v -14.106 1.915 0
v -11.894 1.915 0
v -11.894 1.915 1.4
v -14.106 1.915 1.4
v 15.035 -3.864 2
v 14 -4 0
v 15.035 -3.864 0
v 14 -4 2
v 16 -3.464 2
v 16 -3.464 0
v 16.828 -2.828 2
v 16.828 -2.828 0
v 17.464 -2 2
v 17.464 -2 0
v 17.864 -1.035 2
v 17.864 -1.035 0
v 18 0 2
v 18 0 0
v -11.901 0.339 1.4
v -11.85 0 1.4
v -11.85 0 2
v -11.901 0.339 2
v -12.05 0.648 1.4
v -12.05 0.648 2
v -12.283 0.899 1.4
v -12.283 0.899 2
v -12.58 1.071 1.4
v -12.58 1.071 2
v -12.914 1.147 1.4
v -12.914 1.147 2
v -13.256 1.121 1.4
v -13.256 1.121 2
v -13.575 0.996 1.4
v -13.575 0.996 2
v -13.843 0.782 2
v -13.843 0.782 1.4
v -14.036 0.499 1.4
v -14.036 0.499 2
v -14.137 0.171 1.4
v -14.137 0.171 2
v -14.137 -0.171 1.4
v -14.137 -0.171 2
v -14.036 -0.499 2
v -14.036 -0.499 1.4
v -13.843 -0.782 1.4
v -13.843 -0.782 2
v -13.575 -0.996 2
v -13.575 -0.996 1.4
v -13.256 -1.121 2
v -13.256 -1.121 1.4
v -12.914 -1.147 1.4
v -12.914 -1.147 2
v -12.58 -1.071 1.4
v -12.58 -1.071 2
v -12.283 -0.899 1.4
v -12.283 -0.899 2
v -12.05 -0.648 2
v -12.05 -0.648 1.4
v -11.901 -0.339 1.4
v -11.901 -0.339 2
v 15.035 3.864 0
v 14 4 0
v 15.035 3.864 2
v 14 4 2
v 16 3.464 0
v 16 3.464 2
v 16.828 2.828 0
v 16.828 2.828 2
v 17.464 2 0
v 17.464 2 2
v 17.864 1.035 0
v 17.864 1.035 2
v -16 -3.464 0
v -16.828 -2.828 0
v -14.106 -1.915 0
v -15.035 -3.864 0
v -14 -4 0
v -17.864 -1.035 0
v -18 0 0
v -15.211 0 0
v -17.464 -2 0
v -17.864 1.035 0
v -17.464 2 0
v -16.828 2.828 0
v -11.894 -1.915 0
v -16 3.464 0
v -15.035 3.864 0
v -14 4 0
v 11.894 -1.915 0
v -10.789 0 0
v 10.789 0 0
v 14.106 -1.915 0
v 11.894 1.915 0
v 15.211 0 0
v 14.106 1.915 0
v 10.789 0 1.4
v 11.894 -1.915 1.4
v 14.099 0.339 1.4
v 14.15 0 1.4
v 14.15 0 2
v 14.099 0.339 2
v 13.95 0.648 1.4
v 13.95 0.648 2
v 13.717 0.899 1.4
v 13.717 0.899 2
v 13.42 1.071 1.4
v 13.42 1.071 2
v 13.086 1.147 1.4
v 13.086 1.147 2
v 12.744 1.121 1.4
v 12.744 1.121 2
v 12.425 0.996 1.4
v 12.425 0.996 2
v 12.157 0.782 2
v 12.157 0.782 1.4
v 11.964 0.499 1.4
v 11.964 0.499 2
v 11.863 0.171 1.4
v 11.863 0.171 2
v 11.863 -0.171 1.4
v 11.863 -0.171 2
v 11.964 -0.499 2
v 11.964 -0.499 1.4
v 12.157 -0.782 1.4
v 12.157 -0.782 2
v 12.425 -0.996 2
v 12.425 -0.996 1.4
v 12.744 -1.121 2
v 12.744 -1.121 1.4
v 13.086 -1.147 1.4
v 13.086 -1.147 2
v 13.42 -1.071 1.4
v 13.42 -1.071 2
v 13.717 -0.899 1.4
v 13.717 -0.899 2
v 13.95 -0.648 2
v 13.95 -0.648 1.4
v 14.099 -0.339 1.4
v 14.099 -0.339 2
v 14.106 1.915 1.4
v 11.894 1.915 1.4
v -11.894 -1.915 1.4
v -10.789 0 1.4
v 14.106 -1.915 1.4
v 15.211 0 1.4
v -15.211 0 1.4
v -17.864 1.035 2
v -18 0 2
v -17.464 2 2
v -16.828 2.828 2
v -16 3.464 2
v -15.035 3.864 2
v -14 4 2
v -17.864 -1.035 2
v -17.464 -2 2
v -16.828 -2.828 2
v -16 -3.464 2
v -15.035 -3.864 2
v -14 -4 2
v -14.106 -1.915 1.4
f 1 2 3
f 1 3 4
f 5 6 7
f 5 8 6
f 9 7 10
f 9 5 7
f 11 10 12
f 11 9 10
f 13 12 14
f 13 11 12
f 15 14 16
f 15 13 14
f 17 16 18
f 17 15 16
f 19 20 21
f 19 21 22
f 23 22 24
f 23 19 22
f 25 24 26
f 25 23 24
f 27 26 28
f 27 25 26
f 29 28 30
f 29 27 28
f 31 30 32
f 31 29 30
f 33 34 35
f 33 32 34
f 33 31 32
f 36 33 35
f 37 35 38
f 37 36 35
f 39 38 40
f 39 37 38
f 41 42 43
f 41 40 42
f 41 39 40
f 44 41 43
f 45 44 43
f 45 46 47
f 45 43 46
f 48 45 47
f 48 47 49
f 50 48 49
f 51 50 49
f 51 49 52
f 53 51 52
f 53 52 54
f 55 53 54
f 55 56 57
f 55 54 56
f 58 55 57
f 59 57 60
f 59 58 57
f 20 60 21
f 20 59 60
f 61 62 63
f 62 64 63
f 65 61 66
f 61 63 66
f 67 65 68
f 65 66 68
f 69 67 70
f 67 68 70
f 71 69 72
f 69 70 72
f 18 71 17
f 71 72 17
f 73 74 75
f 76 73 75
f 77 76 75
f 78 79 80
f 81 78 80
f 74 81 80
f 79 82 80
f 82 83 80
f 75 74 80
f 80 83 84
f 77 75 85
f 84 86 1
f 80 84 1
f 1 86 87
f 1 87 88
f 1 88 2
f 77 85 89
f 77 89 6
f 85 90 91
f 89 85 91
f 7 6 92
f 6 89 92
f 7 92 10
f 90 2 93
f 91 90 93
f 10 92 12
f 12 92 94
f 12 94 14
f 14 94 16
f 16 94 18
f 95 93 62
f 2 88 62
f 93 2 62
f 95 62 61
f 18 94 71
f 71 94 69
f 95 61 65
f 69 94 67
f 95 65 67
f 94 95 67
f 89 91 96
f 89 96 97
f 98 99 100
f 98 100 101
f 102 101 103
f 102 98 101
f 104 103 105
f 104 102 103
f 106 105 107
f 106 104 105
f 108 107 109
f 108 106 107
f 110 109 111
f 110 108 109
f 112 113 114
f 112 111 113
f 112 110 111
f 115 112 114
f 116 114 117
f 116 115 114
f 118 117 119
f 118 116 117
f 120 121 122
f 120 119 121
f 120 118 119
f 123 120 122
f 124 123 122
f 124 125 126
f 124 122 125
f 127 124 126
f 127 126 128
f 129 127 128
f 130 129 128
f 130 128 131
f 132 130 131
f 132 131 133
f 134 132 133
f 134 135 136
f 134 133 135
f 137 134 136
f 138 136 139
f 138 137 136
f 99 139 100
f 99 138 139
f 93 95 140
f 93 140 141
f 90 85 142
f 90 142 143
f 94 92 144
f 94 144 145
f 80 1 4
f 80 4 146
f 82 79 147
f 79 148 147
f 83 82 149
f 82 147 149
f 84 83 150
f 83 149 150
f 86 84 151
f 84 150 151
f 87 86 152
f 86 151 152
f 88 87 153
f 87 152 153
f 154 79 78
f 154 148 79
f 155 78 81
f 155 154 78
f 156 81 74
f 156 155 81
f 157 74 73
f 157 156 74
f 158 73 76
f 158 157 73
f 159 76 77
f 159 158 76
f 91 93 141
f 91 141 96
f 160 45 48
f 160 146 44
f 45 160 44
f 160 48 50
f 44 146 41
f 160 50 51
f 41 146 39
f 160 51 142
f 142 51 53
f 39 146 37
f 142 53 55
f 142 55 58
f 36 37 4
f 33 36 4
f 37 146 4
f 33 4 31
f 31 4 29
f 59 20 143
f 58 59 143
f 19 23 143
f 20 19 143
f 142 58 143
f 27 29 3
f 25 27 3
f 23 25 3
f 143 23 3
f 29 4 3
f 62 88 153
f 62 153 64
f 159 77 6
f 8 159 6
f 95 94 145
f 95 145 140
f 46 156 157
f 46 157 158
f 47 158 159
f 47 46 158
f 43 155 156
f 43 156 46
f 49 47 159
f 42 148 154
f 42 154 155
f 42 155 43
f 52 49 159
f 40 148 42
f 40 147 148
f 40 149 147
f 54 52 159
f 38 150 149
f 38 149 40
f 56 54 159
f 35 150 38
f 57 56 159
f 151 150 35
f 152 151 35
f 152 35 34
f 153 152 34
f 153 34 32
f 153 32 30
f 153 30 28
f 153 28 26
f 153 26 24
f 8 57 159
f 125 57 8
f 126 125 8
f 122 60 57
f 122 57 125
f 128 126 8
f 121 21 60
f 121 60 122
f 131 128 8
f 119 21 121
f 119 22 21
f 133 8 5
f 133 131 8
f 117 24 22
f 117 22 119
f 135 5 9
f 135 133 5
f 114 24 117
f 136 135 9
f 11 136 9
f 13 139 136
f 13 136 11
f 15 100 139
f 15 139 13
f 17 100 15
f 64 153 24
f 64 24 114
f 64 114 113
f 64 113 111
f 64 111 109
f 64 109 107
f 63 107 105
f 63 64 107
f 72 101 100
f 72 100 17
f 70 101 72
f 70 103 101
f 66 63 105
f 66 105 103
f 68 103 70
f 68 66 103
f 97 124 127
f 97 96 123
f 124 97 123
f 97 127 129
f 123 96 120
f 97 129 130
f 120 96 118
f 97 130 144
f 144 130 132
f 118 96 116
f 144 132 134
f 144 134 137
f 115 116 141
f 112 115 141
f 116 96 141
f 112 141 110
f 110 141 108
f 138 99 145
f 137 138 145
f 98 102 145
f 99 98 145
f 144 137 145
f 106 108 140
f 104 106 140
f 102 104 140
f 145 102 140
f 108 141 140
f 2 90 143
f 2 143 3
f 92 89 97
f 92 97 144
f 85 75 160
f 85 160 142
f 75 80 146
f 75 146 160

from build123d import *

# Parameters (mm, degrees)
F1_W     = 36
F1_H     = 8
F3_DEPTH = 2
F0_R     = 1.15
F4_DEPTH = 2.001
F5_DEPTH = 1.4
F6_R     = 3.99999


# Not quite as in the source:
# - a fillet or chamfer is up to 0.001 mm smaller than in the source, because OpenCascade refuses the exact size


with BuildPart() as f3:
    # F1 (on Top) → F3 (new body)
    with BuildSketch(Plane.XY):
        Rectangle(F1_W, F1_H)
    extrude(amount=F3_DEPTH)

    # F0 (on Top) → F4 (cut, through all)
    with BuildSketch(Plane.XY):
        with Locations((-13, 0)):
            Circle(F0_R)
        with Locations((13, 0)):
            Circle(F0_R)
    extrude(amount=F4_DEPTH, mode=Mode.SUBTRACT)

    # F2 (on Top) → F5 (cut)
    with BuildSketch(Plane.XY):
        Polygon((-11.8943742345, -1.915), (-10.788748469, 0), (-11.8943742345, 1.915), (-13, 1.915), (-14.1056257655, 1.915), (-15.211251531, 0), (-14.1056257655, -1.915), (-13, -1.915), align=None)
        Polygon((14.1056257655, -1.915), (15.211251531, 0), (14.1056257655, 1.915), (13, 1.915), (11.8943742345, 1.915), (10.788748469, 0), (11.8943742345, -1.915), (13, -1.915), align=None)
    extrude(amount=F5_DEPTH, mode=Mode.SUBTRACT)

    # F6 (radius 4 in the source; OpenCascade refuses exactly that, so slightly less here)
    f6_edges = [f3.edges().sort_by_distance(p)[0] for p in [
        (-18, 4, 1),
        (-18, -4, 1),
        (18, -4, 1),
        (18, 4, 1),
    ]]
    fillet(f6_edges, radius=F6_R)


solid = f3.part
